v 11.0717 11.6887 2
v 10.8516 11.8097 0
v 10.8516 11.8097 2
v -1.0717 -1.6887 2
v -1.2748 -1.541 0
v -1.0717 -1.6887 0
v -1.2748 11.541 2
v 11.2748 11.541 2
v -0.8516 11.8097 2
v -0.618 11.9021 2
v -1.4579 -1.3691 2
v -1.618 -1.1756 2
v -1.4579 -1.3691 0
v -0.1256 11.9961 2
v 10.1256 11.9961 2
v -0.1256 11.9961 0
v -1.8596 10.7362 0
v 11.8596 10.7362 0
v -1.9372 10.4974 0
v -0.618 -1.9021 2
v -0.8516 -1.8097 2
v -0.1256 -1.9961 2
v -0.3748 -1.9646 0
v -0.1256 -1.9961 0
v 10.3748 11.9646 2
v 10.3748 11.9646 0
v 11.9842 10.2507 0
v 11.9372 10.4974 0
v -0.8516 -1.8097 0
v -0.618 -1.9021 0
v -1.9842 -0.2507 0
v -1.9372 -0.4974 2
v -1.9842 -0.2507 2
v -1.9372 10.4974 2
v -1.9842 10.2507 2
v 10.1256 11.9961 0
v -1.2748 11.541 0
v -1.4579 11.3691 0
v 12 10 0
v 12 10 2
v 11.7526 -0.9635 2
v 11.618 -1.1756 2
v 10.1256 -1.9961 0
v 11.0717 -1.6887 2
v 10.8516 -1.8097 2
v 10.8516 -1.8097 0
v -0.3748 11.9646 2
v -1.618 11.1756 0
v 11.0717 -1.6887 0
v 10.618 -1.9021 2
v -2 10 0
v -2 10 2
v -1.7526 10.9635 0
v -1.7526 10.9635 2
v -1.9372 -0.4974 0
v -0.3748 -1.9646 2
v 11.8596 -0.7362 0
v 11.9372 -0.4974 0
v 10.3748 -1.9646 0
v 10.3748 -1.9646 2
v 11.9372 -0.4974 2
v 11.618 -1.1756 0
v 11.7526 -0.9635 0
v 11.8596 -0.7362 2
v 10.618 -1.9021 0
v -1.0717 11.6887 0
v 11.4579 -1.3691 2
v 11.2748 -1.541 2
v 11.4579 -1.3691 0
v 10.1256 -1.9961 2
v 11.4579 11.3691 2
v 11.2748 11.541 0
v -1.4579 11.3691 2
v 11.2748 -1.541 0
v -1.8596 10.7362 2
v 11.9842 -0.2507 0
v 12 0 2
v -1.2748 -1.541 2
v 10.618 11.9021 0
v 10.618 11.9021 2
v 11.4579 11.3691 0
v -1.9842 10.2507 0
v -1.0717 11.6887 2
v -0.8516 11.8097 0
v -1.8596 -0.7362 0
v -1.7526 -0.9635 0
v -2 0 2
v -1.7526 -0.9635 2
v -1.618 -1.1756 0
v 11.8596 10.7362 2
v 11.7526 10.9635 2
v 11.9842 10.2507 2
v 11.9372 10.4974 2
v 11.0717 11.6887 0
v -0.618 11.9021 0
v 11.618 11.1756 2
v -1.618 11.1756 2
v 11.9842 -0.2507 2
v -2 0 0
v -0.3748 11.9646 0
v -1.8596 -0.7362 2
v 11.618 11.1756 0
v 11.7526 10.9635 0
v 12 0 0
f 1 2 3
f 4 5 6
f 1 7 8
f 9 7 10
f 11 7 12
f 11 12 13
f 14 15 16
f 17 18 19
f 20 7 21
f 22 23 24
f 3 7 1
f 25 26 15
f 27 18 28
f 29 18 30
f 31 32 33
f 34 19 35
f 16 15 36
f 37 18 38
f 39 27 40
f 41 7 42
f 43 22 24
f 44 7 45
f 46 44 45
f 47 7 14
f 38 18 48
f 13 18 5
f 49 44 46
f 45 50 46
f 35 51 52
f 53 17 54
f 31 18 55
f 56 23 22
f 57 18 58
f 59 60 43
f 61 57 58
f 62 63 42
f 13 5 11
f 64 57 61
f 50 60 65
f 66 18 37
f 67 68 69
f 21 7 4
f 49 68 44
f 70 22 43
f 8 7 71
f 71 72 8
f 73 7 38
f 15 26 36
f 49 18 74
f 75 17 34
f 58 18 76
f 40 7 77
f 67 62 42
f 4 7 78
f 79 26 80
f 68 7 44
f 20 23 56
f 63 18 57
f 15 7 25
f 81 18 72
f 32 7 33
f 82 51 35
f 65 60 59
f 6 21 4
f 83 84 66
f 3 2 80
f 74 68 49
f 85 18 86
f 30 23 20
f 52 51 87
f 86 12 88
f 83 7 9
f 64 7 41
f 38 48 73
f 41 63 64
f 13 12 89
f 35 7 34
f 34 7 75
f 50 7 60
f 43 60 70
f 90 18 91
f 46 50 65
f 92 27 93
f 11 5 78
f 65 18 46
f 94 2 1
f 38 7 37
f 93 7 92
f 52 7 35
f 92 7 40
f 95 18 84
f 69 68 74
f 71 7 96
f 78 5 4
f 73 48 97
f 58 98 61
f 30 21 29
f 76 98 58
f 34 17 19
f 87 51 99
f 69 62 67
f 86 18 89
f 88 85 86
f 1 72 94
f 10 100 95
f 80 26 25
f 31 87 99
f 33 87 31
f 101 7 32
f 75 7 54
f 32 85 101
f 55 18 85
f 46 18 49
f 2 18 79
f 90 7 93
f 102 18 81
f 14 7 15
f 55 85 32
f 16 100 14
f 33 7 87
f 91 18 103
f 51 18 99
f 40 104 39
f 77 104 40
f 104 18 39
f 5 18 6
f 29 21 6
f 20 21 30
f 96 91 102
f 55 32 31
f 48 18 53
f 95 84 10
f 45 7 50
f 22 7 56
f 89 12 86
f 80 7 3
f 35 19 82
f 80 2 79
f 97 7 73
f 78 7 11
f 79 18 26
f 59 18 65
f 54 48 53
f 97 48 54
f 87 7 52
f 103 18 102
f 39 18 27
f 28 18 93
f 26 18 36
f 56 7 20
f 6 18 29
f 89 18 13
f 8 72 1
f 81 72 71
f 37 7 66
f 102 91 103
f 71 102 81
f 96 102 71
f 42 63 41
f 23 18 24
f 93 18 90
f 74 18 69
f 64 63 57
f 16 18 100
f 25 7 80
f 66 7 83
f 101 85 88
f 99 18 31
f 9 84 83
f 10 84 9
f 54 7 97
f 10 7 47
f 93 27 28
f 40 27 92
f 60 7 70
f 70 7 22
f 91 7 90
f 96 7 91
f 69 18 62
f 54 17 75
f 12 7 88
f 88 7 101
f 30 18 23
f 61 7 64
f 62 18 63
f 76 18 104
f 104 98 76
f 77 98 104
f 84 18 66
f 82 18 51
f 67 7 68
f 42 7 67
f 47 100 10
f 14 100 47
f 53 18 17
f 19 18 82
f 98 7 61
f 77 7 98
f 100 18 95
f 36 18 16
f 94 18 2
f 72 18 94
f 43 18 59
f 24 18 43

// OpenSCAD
$fn=50;
minkowski()
{
  cube([10,10,1]);
  cylinder(r=2,h=1);
}
